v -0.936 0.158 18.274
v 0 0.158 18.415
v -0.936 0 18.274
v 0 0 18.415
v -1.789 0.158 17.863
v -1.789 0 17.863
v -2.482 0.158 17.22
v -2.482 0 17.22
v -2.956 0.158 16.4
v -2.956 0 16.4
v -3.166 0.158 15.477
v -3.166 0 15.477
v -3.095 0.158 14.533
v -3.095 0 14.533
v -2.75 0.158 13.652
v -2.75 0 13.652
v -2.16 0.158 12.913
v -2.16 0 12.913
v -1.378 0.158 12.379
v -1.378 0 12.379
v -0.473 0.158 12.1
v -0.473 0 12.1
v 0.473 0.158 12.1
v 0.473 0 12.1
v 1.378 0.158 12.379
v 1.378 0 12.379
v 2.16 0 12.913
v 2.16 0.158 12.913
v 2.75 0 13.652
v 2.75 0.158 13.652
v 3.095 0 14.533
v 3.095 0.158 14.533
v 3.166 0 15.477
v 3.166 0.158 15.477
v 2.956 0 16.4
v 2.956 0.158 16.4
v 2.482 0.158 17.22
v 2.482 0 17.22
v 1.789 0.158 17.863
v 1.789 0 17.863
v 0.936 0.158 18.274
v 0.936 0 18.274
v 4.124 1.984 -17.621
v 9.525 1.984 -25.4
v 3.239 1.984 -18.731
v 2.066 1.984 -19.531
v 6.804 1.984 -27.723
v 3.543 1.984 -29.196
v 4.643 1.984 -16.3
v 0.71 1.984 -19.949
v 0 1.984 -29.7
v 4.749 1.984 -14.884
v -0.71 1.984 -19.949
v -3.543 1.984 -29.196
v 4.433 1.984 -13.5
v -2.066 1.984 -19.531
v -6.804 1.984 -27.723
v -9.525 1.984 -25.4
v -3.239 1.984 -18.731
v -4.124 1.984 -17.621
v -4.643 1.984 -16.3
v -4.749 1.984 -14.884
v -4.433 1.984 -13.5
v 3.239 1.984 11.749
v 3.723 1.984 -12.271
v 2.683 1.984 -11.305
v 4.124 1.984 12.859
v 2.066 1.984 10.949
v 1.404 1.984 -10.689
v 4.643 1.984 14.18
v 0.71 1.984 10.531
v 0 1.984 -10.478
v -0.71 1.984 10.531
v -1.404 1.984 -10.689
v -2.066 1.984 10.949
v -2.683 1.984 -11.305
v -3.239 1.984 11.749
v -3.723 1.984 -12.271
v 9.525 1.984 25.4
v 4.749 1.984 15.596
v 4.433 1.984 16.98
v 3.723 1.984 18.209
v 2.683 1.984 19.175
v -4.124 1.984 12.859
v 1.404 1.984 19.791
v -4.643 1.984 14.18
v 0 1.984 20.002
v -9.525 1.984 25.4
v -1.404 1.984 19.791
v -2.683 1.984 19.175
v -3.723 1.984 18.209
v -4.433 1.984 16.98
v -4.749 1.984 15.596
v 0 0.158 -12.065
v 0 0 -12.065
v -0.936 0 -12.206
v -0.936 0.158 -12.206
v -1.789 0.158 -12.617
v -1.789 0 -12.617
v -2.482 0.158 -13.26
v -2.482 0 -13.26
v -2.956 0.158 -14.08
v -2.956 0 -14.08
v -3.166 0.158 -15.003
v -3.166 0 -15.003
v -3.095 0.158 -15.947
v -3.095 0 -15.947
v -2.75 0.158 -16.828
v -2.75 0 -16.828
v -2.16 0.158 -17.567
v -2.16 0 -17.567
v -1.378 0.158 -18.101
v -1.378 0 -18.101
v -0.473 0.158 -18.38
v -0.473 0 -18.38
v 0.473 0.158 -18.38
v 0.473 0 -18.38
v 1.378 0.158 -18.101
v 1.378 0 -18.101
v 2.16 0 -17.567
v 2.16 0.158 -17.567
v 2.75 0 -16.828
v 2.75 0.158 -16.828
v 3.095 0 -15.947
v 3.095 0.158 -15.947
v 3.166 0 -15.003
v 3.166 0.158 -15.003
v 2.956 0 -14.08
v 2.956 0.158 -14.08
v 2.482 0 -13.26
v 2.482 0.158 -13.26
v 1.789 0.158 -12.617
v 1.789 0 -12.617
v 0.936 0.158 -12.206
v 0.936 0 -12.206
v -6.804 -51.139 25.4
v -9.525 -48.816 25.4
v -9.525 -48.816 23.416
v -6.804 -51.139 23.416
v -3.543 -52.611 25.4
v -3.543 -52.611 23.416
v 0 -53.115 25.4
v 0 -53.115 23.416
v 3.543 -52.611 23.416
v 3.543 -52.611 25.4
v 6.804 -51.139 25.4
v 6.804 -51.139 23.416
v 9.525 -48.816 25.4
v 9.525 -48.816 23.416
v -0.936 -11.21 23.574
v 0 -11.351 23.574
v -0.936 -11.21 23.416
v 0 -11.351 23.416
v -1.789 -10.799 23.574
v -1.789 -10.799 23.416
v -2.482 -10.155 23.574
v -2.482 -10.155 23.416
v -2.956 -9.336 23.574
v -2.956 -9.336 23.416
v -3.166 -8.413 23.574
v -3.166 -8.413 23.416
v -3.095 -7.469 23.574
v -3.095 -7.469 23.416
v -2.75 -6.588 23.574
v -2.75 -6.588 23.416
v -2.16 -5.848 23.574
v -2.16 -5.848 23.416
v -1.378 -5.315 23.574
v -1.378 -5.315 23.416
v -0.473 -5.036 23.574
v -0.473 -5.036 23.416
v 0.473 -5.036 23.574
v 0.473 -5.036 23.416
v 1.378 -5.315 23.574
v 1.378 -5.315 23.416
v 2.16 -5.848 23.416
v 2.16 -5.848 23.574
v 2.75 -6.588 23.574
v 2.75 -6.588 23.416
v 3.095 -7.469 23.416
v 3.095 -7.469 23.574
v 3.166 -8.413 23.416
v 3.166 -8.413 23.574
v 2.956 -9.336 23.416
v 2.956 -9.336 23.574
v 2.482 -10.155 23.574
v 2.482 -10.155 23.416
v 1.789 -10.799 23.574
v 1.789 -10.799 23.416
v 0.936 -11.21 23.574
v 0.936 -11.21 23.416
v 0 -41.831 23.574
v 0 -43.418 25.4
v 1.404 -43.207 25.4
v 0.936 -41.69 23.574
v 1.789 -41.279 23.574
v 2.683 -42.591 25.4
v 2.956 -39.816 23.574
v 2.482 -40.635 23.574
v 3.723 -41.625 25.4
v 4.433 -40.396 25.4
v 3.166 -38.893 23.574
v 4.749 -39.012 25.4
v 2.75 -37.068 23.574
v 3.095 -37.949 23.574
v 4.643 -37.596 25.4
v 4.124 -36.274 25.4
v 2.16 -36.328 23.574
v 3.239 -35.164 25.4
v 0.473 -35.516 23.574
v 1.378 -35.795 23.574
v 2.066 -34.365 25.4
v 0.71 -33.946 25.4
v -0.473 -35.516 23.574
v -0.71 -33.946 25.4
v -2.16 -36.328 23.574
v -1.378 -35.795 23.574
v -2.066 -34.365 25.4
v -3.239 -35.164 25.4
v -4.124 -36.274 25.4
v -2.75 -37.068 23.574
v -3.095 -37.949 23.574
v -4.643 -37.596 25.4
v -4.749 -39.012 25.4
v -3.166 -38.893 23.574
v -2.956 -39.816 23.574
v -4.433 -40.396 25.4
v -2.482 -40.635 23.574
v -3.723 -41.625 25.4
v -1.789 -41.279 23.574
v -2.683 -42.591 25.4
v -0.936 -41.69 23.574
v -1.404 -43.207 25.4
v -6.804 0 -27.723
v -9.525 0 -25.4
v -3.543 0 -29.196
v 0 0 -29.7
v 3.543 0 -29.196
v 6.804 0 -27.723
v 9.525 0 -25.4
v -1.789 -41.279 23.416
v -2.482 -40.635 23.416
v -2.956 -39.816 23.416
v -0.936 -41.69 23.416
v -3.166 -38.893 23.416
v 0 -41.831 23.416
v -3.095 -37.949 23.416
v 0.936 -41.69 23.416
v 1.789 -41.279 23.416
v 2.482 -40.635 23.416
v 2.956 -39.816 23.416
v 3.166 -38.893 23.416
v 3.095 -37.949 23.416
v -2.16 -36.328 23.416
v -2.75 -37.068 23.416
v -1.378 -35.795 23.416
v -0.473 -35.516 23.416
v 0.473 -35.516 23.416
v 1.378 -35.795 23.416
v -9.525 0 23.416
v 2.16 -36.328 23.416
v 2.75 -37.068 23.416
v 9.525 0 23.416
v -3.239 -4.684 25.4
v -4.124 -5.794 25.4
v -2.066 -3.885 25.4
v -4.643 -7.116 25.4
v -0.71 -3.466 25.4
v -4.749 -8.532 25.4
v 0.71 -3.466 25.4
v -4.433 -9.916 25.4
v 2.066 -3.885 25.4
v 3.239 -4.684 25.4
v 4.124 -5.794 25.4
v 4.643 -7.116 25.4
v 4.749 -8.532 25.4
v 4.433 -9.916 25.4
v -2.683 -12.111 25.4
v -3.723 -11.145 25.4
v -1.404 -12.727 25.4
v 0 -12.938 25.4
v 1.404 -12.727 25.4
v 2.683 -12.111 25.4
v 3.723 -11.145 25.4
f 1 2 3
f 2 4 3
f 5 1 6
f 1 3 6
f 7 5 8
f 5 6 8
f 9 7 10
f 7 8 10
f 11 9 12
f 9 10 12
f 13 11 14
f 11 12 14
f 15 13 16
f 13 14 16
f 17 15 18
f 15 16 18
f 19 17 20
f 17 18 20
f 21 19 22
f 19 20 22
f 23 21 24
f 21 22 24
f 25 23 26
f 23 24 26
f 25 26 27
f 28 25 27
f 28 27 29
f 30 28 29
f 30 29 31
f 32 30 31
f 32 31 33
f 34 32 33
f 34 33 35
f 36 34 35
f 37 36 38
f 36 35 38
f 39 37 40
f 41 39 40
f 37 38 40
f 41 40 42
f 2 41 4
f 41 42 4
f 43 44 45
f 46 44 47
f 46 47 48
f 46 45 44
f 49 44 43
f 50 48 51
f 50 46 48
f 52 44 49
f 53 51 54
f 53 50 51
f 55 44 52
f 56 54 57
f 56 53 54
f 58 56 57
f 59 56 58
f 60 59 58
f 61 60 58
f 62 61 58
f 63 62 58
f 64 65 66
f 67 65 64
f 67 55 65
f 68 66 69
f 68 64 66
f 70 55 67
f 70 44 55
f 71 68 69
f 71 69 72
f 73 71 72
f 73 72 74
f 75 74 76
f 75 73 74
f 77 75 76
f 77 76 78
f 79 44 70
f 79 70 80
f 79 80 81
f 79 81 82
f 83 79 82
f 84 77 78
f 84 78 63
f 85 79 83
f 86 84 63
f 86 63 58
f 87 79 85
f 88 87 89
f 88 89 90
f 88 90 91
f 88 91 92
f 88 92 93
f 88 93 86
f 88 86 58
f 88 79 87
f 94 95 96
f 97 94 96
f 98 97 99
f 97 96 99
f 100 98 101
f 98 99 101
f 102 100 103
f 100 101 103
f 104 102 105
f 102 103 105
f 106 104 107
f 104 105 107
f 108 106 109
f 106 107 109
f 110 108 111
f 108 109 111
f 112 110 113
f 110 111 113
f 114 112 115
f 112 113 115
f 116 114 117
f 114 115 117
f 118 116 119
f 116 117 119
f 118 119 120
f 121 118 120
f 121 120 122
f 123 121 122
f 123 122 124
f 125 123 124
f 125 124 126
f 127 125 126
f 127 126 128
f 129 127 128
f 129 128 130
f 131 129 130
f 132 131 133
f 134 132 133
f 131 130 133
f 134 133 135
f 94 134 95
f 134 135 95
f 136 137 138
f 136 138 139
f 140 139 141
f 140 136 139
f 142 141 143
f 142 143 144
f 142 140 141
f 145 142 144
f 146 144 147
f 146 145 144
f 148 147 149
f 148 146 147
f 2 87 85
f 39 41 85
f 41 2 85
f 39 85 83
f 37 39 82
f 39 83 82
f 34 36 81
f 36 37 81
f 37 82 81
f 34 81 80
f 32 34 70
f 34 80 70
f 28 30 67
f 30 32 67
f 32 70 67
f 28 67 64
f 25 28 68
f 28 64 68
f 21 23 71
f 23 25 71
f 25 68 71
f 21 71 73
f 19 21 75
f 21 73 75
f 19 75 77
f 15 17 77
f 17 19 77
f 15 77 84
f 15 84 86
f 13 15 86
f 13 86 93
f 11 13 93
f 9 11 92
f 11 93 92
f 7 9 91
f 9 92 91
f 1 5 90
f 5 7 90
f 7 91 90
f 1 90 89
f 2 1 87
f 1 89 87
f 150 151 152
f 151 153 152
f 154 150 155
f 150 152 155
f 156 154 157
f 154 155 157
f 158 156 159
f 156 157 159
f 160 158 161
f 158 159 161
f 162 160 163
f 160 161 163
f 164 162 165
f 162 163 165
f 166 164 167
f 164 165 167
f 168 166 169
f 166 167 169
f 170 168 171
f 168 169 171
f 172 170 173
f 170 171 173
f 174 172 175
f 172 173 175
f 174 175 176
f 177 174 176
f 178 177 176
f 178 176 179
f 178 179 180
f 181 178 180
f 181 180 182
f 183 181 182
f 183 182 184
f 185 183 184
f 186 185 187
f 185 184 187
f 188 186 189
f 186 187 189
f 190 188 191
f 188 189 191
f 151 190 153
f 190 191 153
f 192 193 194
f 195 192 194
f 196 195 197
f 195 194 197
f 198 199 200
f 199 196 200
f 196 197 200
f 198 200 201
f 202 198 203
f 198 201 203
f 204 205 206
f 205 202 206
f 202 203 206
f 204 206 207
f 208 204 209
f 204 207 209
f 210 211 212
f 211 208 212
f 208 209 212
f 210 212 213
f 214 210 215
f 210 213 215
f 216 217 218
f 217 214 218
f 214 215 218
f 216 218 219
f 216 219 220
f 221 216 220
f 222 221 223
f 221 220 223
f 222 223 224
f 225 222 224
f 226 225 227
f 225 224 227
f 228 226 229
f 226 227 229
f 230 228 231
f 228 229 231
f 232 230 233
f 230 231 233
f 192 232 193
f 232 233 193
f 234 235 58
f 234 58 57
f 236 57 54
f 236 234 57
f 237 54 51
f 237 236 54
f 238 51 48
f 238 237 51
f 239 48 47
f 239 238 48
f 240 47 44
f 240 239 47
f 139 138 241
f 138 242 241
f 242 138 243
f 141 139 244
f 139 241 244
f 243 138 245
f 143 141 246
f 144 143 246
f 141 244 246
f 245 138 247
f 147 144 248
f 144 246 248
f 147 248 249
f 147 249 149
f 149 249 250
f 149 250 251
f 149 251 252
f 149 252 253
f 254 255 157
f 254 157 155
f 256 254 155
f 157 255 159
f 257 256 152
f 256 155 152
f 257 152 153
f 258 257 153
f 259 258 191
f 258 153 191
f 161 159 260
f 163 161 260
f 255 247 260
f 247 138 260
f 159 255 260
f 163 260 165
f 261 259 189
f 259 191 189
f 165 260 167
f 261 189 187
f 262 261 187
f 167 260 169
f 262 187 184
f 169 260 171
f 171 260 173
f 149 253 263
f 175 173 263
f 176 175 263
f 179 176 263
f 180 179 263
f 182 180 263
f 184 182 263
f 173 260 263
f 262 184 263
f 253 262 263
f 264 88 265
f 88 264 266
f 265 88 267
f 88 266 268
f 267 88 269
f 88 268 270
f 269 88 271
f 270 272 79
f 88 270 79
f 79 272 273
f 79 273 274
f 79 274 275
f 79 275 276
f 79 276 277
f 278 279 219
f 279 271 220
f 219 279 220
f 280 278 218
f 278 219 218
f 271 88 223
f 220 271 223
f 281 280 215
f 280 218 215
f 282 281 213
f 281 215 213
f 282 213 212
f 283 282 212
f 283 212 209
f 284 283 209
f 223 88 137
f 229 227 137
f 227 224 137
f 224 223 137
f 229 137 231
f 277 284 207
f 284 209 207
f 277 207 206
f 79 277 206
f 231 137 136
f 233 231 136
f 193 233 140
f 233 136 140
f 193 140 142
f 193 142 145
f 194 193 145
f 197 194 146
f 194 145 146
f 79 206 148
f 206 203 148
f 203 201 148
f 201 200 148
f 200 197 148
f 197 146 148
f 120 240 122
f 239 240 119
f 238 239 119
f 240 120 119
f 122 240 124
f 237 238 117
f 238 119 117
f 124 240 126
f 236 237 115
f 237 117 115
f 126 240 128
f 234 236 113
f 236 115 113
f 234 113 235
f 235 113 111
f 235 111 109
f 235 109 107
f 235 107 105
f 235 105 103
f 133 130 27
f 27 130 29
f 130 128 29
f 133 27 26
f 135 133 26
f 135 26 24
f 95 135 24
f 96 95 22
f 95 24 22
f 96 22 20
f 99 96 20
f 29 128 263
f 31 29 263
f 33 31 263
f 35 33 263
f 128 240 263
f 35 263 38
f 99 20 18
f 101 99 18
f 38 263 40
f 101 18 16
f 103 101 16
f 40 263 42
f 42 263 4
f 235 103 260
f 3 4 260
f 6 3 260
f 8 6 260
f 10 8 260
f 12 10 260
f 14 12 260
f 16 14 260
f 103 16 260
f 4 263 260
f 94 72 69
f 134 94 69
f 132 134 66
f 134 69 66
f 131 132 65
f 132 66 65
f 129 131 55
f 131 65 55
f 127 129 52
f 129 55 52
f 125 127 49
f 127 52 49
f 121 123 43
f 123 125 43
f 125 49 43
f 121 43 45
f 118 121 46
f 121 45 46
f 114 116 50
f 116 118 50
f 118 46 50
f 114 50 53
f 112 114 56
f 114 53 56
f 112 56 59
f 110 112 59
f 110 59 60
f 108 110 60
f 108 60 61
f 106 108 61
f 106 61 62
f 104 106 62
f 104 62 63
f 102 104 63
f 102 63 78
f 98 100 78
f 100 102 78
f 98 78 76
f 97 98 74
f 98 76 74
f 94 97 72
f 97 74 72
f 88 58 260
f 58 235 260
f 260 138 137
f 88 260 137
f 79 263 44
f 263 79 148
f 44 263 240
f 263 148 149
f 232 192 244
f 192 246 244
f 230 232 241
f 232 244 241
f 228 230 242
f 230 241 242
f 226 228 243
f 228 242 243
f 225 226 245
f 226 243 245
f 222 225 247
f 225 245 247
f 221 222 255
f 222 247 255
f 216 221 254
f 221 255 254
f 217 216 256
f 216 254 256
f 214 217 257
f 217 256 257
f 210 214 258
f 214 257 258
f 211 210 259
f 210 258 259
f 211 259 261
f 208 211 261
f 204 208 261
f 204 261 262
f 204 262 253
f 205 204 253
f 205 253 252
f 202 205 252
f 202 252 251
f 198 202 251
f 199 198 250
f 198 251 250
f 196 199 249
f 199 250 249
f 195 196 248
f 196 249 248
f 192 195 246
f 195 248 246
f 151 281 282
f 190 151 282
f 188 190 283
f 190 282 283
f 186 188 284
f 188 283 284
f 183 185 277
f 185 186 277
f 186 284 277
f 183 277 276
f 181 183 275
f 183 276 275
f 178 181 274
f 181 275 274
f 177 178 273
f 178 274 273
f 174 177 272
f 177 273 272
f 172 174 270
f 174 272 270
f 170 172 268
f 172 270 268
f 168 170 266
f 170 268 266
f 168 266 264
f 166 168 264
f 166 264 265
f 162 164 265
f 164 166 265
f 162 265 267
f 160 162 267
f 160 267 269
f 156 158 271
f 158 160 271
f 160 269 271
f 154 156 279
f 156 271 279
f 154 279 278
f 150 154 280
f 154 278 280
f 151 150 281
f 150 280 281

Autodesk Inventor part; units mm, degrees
ref_plane "YZ Plane" through (0, 0, 0) normal (1, 0, 0) x (0, 1, 0)
ref_plane "XZ Plane" through (0, 0, 0) normal (0, 1, 0) x (-1, 0, 0)
ref_plane "XY Plane" through (0, 0, 0) normal (0, 0, 1) x (1, 0, 0)
sketch "Sketch4" plane through (0, 0, 0) normal (0, 1, 0) x (-1, 0, 0)
  line L0 (9.525, 25.4) -> (-9.525, 25.4)
  line L1 (-9.525, 25.4) -> (-9.525, -25.4)
  line L2 (-9.525, -25.4) -> (9.525, -25.4)
  line L3 (9.525, -25.4) -> (9.525, 25.4)
  line L4 (9.525, 25.4) -> (-9.525, -25.4) construction
  line L5 (-9.525, 25.4) -> (9.525, -25.4) construction
  arc A0 (-9.525, -25.4) -> (9.525, -25.4) centre (0, -16.9997) ccw
  point P0 (0, 0)
  dimension "d10" = 19.05
  dimension "d11" = 50.8
  dimension "d12" = 12.7
extrude "Extrusion2" add sketch "Sketch4" along normal blind 1.9844
sketch "Sketch5" plane through (0, 1.9844, 0) normal (0, 1, 0) x (1, 0, 0)
  point P0 (0, 0)
  point P1 (0, 15.24)
  point P2 (0, -15.24)
  dimension "d15" = 15.24
  dimension "d16" = 15.24
hole "Hole1" at (0, 1.9844, -15.24) at (0, 1.9844, 15.24) direction (0, -1, 0) diameter 6.35 depth 15.6718 tip angle 118 countersink diameter 9.525 countersink angle 82
sketch "Sketch6" plane through (-9.525, 0, 25.4) normal (0, 0, 1) x (1, 0, 0)
  line L0 (0, 1.9844) -> (19.05, 1.9844)
  line L1 (19.05, 1.9844) -> (19.05, -48.8156)
  line L2 (19.05, -48.8156) -> (0, -48.8156)
  line L3 (0, -48.8156) -> (0, 1.9844)
  arc A0 (0, -48.8156) -> (19.05, -48.8156) centre (9.525, -40.4154) ccw
  point P0 (9.525, 0)
  dimension "d24" = 19.05
  dimension "d25" = 50.8
  dimension "d28" = 12.7
extrude "Extrusion3" add sketch "Sketch6" against normal blind 1.9844
sketch "Sketch7" plane through (-9.525, 1.9844, 25.4) normal (0, 0, 1) x (1, 0, 0)
  line L0 (0, -50.8) -> (0, 0) construction
  line L1 (19.05, -1.9844) -> (19.05, -50.8) construction
  line L2 (0, 0) -> (19.05, 0) construction
  line L3 (19.05, 0) -> (19.05, -50.8) construction
  line L4 (19.05, -50.8) -> (0, -50.8) construction
  line L5 (0, -50.8) -> (0, 0) construction
  line L6 (9.525, -25.4) -> (19.05, -25.4) construction
  point P0 (9.525, -1.9844)
  point P1 (9.525, -10.16)
  point P2 (9.525, -40.64)
  dimension "d29" = 15.24
  dimension "d30" = 15.24
hole "Hole2" at (0, -8.1756, 25.4) at (0, -38.6556, 25.4) direction (0, 0, -1) diameter 6.35 depth 15.6718 tip angle 118 countersink diameter 9.525 countersink angle 82
equation "\"d16\" = d15"
equation "\"d30\" = d29"
properties part number "CornerBrace"
